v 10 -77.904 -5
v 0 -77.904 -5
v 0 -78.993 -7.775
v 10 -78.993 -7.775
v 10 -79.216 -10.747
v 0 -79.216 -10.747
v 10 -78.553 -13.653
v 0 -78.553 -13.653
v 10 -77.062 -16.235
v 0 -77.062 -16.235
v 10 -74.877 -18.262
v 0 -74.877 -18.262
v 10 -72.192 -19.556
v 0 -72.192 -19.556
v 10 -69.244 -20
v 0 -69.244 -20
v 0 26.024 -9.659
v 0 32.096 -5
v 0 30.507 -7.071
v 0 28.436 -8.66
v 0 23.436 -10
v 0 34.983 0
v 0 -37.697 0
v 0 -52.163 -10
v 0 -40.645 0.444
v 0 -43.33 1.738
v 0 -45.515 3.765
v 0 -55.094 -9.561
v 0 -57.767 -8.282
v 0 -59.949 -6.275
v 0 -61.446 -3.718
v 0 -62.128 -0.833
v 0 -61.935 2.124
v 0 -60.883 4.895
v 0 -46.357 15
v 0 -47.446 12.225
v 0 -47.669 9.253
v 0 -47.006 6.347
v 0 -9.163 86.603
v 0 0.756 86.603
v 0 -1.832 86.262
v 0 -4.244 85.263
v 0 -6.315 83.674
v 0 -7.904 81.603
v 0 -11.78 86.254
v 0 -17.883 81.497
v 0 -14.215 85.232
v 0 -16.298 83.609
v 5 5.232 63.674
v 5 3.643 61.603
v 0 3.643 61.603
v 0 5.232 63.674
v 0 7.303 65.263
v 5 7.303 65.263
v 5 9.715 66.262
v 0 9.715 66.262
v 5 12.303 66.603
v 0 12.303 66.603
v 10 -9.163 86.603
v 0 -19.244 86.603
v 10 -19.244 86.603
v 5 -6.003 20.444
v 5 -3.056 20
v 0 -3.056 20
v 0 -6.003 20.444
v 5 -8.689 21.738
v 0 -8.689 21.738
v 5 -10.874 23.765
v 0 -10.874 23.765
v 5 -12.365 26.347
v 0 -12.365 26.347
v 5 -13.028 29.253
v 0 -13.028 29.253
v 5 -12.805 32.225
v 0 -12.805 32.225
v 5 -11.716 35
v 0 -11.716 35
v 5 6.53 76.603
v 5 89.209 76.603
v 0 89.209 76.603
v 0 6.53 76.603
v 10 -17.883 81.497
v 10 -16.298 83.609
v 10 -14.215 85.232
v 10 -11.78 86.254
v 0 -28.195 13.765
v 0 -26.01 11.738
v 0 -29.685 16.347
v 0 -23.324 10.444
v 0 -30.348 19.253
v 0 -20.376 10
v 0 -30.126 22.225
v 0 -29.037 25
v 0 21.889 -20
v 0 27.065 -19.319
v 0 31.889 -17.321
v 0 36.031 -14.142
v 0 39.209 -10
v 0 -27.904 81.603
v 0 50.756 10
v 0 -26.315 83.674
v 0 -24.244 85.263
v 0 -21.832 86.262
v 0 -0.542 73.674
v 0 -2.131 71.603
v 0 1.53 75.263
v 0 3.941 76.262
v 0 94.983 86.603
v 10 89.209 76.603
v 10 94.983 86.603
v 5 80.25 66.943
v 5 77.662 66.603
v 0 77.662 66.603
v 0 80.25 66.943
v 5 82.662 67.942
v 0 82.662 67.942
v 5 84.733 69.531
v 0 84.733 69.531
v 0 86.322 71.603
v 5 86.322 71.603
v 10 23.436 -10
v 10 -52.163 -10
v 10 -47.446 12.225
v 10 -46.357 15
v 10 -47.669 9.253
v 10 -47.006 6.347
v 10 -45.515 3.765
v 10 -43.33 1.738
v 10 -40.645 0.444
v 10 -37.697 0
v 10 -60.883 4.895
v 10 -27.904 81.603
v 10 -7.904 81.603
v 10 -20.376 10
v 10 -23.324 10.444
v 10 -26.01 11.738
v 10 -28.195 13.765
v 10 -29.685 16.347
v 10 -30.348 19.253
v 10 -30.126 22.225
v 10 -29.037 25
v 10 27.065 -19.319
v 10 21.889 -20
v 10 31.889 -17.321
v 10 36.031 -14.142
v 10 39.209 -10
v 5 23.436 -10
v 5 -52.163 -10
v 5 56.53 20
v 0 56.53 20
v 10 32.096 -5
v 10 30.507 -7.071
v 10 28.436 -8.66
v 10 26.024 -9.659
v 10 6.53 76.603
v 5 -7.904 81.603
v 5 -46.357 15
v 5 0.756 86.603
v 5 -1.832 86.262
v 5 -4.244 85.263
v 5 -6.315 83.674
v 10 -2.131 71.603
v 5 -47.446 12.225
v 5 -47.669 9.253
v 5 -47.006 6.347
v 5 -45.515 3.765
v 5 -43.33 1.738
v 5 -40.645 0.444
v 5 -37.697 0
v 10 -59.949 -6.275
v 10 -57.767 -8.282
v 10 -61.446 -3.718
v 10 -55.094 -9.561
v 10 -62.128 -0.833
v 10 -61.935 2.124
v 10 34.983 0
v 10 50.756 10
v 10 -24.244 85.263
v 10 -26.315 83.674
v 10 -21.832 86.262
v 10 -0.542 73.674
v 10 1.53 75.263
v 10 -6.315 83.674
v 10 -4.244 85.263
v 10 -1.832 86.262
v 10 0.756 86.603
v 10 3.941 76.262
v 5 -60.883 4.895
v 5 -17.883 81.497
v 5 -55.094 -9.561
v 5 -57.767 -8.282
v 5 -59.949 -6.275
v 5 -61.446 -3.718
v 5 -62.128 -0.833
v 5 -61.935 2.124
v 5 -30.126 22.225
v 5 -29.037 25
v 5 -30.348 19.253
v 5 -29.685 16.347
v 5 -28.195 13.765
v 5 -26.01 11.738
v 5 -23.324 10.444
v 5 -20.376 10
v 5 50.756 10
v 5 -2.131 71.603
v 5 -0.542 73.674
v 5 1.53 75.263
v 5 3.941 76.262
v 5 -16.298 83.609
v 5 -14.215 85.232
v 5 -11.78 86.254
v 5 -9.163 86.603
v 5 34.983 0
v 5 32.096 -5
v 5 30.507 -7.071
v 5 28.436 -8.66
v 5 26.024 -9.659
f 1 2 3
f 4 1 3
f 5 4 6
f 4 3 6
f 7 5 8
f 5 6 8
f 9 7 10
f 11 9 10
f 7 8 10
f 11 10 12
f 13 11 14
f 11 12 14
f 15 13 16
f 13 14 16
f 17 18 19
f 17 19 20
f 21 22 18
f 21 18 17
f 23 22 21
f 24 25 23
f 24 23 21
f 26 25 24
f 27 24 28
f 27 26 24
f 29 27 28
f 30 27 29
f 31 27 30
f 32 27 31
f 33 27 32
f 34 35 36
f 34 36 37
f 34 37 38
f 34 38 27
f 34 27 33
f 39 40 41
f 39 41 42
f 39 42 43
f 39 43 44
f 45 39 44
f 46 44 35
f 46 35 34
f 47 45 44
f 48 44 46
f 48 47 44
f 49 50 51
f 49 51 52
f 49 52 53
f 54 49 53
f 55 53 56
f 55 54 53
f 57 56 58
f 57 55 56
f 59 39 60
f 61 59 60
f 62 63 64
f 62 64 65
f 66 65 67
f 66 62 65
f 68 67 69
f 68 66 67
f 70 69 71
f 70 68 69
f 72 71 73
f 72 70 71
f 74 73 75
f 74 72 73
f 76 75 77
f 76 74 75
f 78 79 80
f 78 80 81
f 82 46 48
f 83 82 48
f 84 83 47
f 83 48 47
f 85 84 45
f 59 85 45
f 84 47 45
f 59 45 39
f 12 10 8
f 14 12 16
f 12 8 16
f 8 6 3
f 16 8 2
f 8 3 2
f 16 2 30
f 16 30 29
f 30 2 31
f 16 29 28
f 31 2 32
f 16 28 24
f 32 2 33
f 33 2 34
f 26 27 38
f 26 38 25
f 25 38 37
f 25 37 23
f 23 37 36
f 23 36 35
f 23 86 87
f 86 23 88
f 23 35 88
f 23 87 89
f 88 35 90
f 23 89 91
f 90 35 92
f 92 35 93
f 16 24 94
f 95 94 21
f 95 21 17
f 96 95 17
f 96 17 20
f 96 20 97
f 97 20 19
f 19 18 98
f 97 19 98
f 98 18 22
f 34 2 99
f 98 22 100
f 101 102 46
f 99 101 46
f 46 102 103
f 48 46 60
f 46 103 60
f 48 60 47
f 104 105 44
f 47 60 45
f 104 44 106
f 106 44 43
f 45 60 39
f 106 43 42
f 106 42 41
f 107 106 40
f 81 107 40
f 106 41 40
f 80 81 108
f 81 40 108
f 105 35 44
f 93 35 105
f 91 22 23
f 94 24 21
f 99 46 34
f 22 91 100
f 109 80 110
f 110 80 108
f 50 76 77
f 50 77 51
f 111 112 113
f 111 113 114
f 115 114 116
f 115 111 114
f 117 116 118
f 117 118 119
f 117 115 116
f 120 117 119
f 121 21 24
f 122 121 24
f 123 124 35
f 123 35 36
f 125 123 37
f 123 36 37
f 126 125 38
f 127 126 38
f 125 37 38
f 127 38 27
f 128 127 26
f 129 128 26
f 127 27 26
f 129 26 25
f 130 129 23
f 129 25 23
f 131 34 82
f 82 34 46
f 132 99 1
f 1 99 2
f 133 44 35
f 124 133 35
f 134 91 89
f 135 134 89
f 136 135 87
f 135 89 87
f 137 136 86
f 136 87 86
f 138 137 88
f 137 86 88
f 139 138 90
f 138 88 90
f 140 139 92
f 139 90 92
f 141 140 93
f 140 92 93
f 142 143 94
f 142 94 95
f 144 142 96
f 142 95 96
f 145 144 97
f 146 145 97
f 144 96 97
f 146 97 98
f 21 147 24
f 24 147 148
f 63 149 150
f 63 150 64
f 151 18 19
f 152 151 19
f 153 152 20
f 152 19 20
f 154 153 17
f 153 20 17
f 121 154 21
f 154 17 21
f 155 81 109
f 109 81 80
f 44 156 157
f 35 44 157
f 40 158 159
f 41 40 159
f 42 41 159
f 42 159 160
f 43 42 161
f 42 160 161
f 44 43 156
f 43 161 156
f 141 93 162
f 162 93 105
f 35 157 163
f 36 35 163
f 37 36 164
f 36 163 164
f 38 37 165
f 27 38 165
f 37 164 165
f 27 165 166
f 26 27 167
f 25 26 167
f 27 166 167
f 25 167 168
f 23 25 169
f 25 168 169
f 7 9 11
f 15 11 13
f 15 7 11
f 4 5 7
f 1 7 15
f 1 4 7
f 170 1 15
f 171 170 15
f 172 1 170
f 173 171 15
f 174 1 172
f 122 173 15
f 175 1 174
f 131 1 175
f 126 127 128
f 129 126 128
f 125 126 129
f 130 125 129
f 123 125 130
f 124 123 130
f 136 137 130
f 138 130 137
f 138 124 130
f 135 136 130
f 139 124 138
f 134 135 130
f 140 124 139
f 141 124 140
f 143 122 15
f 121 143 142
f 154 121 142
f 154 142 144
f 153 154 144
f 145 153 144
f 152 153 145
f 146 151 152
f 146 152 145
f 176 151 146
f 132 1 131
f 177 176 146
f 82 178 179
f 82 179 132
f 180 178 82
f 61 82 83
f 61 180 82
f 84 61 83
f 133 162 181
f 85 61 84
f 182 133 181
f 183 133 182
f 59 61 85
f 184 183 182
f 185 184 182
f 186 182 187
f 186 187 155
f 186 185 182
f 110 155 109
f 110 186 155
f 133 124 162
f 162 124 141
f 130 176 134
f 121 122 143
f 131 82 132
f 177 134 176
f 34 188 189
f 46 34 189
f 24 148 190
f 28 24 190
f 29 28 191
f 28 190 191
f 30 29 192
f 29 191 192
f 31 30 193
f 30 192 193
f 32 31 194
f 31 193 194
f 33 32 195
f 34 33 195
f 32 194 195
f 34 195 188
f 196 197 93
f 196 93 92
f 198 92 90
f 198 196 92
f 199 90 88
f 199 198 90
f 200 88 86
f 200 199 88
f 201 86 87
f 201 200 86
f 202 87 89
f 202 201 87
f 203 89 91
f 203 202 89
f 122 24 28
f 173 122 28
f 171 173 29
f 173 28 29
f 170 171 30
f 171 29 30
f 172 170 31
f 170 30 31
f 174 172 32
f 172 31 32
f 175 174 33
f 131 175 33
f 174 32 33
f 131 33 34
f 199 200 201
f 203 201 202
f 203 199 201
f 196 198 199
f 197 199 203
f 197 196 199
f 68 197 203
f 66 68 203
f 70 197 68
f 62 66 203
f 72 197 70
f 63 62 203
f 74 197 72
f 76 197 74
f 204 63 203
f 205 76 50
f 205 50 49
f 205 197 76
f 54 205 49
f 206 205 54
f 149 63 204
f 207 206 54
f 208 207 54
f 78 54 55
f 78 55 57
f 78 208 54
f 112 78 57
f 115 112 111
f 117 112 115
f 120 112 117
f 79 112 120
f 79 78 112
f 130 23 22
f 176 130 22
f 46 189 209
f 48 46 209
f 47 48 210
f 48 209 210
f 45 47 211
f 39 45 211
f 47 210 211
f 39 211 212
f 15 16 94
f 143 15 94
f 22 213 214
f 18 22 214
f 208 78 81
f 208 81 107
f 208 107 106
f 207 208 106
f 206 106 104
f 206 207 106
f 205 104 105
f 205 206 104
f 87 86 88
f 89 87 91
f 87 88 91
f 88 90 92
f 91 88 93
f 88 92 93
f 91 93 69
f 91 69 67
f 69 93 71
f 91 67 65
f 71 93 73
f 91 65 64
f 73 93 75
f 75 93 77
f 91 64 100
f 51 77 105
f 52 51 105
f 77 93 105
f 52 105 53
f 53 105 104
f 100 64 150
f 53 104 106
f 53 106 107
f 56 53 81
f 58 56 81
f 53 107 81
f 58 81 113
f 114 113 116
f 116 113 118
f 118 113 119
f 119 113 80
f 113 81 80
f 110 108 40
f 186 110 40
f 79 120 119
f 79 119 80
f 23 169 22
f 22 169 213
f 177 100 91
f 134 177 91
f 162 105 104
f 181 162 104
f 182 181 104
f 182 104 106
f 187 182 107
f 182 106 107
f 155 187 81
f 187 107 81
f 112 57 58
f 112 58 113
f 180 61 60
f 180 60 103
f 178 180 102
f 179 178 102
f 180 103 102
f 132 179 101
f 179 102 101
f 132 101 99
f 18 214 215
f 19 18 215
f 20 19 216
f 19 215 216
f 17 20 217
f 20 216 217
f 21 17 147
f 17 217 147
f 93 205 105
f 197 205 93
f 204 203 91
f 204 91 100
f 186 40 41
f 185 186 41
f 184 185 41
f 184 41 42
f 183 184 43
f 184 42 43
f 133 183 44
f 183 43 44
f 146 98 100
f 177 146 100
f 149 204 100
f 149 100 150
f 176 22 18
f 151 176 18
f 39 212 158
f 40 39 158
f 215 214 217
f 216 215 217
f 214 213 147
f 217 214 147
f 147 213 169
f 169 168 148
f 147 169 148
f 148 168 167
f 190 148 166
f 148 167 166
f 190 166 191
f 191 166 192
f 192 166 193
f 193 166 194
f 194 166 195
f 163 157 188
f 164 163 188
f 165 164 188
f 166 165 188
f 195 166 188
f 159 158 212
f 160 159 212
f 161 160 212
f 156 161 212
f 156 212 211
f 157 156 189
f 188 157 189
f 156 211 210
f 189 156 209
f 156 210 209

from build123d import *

# Parameters (mm, degrees)
BOSS_EXTRUDE1_DEPTH = 10
BOSS_EXTRUDE2_START = -5
BOSS_EXTRUDE2_DEPTH = 5
BOSS_EXTRUDE3_DEPTH = 5


with BuildPart() as part:
    # Sketch1 → Boss-Extrude1 (new body)
    with BuildSketch(Plane.YZ):
        with BuildLine():
            Line((94.982533692, 86.602540378), (0.756036384, 86.602540378))
            ThreePointArc((0.756036384, 86.602540378), (-4.243963616, 85.262794416), (-7.904217654, 81.602540378))
            Line((-7.904217654, 81.602540378), (-46.35721227, 15))
            ThreePointArc((-46.35721227, 15), (-46.35721227, 5), (-37.696958232, 0))
            Line((-37.696958232, 0), (34.982533692, 0))
            Line((34.982533692, 0), (32.095782346, -5))
            ThreePointArc((32.095782346, -5), (28.435528308, -8.660254038), (23.435528308, -10))
            Line((23.435528308, -10), (-52.162828812, -10))
            ThreePointArc((-52.162828812, -10), (-60.79269002, -5.052276273), (-60.882917416, 4.894900893))
            Line((-60.882917416, 4.894900893), (-17.883142944, 81.497441271))
            ThreePointArc((-17.883142944, 81.497441271), (-14.215330614, 85.232401586), (-9.163054341, 86.602540378))
            Line((-9.163054341, 86.602540378), (-15.017466308, 86.602540378))
            Line((-15.017466308, 86.602540378), (-19.243963616, 86.602540378))
            ThreePointArc((-19.243963616, 86.602540378), (-24.243963616, 85.262794416), (-27.904217654, 81.602540378))
            Line((-27.904217654, 81.602540378), (-77.904217654, -5))
            ThreePointArc((-77.904217654, -5), (-77.904217654, -15), (-69.243963616, -20))
            Line((-69.243963616, -20), (21.888522925, -20))
            ThreePointArc((21.888522925, -20), (31.888522925, -17.320508076), (39.209031, -10))
            Line((39.209031, -10), (50.756036384, 10))
            Line((50.756036384, 10), (-20.376450156, 10))
            ThreePointArc((-20.376450156, 10), (-29.036704194, 15), (-29.036704194, 25))
            Line((-29.036704194, 25), (-2.130714962, 71.602540378))
            ThreePointArc((-2.130714962, 71.602540378), (1.529539076, 75.262794416), (6.529539076, 76.602540378))
            Line((6.529539076, 76.602540378), (83.435528308, 76.602540378))
            Line((83.435528308, 76.602540378), (89.209031, 76.602540378))
            Line((89.209031, 76.602540378), (92.095782346, 81.602540378))
            Line((92.095782346, 81.602540378), (94.982533692, 86.602540378))
        make_face()
    extrude(amount=BOSS_EXTRUDE1_DEPTH)


with BuildPart() as body_2:
    # Sketch2 → Boss-Extrude2 (new body)
    with BuildSketch(Plane.YZ.offset(10).offset(BOSS_EXTRUDE2_START)):
        with BuildLine():
            Line((-9.163054341, 86.602540378), (0.756036384, 86.602540378))
            ThreePointArc((0.756036384, 86.602540378), (-4.243963616, 85.262794416), (-7.904217654, 81.602540378))
            Line((-7.904217654, 81.602540378), (-46.35721227, 15))
            ThreePointArc((-46.35721227, 15), (-46.35721227, 5), (-37.696958232, 0))
            Line((-37.696958232, 0), (34.982533692, 0))
            Line((34.982533692, 0), (32.095782346, -5))
            ThreePointArc((32.095782346, -5), (28.435528308, -8.660254038), (23.435528308, -10))
            Line((23.435528308, -10), (-52.162828812, -10))
            ThreePointArc((-52.162828812, -10), (-60.79269002, -5.052276273), (-60.882917416, 4.894900893))
            Line((-60.882917416, 4.894900893), (-17.883142944, 81.497441271))
            ThreePointArc((-17.883142944, 81.497441271), (-14.215330614, 85.232401586), (-9.163054341, 86.602540378))
        make_face()
    extrude(amount=-BOSS_EXTRUDE2_DEPTH)


with BuildPart() as body_3:
    # Sketch3 → Boss-Extrude3 (new body)
    with BuildSketch(Plane.YZ.offset(5)):
        with BuildLine():
            Line((-11.716196119, 35), (3.64278773, 61.602540378))
            ThreePointArc((3.64278773, 61.602540378), (7.303041768, 65.262794416), (12.303041768, 66.602540378))
            Line((12.303041768, 66.602540378), (77.662025616, 66.602540378))
            ThreePointArc((77.662025616, 66.602540378), (82.662025616, 67.942286341), (86.322279654, 71.602540378))
            Line((86.322279654, 71.602540378), (89.209031, 76.602540378))
            Line((89.209031, 76.602540378), (6.529539076, 76.602540378))
            ThreePointArc((6.529539076, 76.602540378), (1.529539076, 75.262794416), (-2.130714962, 71.602540378))
            Line((-2.130714962, 71.602540378), (-29.036704194, 25))
            ThreePointArc((-29.036704194, 25), (-29.036704194, 15), (-20.376450156, 10))
            Line((-20.376450156, 10), (50.756036384, 10))
            Line((50.756036384, 10), (56.529539076, 20))
            Line((56.529539076, 20), (-3.055942081, 20))
            ThreePointArc((-3.055942081, 20), (-11.716196119, 25), (-11.716196119, 35))
        make_face()
    extrude(amount=-BOSS_EXTRUDE3_DEPTH)


solid = Compound([part.part, body_2.part, body_3.part])
